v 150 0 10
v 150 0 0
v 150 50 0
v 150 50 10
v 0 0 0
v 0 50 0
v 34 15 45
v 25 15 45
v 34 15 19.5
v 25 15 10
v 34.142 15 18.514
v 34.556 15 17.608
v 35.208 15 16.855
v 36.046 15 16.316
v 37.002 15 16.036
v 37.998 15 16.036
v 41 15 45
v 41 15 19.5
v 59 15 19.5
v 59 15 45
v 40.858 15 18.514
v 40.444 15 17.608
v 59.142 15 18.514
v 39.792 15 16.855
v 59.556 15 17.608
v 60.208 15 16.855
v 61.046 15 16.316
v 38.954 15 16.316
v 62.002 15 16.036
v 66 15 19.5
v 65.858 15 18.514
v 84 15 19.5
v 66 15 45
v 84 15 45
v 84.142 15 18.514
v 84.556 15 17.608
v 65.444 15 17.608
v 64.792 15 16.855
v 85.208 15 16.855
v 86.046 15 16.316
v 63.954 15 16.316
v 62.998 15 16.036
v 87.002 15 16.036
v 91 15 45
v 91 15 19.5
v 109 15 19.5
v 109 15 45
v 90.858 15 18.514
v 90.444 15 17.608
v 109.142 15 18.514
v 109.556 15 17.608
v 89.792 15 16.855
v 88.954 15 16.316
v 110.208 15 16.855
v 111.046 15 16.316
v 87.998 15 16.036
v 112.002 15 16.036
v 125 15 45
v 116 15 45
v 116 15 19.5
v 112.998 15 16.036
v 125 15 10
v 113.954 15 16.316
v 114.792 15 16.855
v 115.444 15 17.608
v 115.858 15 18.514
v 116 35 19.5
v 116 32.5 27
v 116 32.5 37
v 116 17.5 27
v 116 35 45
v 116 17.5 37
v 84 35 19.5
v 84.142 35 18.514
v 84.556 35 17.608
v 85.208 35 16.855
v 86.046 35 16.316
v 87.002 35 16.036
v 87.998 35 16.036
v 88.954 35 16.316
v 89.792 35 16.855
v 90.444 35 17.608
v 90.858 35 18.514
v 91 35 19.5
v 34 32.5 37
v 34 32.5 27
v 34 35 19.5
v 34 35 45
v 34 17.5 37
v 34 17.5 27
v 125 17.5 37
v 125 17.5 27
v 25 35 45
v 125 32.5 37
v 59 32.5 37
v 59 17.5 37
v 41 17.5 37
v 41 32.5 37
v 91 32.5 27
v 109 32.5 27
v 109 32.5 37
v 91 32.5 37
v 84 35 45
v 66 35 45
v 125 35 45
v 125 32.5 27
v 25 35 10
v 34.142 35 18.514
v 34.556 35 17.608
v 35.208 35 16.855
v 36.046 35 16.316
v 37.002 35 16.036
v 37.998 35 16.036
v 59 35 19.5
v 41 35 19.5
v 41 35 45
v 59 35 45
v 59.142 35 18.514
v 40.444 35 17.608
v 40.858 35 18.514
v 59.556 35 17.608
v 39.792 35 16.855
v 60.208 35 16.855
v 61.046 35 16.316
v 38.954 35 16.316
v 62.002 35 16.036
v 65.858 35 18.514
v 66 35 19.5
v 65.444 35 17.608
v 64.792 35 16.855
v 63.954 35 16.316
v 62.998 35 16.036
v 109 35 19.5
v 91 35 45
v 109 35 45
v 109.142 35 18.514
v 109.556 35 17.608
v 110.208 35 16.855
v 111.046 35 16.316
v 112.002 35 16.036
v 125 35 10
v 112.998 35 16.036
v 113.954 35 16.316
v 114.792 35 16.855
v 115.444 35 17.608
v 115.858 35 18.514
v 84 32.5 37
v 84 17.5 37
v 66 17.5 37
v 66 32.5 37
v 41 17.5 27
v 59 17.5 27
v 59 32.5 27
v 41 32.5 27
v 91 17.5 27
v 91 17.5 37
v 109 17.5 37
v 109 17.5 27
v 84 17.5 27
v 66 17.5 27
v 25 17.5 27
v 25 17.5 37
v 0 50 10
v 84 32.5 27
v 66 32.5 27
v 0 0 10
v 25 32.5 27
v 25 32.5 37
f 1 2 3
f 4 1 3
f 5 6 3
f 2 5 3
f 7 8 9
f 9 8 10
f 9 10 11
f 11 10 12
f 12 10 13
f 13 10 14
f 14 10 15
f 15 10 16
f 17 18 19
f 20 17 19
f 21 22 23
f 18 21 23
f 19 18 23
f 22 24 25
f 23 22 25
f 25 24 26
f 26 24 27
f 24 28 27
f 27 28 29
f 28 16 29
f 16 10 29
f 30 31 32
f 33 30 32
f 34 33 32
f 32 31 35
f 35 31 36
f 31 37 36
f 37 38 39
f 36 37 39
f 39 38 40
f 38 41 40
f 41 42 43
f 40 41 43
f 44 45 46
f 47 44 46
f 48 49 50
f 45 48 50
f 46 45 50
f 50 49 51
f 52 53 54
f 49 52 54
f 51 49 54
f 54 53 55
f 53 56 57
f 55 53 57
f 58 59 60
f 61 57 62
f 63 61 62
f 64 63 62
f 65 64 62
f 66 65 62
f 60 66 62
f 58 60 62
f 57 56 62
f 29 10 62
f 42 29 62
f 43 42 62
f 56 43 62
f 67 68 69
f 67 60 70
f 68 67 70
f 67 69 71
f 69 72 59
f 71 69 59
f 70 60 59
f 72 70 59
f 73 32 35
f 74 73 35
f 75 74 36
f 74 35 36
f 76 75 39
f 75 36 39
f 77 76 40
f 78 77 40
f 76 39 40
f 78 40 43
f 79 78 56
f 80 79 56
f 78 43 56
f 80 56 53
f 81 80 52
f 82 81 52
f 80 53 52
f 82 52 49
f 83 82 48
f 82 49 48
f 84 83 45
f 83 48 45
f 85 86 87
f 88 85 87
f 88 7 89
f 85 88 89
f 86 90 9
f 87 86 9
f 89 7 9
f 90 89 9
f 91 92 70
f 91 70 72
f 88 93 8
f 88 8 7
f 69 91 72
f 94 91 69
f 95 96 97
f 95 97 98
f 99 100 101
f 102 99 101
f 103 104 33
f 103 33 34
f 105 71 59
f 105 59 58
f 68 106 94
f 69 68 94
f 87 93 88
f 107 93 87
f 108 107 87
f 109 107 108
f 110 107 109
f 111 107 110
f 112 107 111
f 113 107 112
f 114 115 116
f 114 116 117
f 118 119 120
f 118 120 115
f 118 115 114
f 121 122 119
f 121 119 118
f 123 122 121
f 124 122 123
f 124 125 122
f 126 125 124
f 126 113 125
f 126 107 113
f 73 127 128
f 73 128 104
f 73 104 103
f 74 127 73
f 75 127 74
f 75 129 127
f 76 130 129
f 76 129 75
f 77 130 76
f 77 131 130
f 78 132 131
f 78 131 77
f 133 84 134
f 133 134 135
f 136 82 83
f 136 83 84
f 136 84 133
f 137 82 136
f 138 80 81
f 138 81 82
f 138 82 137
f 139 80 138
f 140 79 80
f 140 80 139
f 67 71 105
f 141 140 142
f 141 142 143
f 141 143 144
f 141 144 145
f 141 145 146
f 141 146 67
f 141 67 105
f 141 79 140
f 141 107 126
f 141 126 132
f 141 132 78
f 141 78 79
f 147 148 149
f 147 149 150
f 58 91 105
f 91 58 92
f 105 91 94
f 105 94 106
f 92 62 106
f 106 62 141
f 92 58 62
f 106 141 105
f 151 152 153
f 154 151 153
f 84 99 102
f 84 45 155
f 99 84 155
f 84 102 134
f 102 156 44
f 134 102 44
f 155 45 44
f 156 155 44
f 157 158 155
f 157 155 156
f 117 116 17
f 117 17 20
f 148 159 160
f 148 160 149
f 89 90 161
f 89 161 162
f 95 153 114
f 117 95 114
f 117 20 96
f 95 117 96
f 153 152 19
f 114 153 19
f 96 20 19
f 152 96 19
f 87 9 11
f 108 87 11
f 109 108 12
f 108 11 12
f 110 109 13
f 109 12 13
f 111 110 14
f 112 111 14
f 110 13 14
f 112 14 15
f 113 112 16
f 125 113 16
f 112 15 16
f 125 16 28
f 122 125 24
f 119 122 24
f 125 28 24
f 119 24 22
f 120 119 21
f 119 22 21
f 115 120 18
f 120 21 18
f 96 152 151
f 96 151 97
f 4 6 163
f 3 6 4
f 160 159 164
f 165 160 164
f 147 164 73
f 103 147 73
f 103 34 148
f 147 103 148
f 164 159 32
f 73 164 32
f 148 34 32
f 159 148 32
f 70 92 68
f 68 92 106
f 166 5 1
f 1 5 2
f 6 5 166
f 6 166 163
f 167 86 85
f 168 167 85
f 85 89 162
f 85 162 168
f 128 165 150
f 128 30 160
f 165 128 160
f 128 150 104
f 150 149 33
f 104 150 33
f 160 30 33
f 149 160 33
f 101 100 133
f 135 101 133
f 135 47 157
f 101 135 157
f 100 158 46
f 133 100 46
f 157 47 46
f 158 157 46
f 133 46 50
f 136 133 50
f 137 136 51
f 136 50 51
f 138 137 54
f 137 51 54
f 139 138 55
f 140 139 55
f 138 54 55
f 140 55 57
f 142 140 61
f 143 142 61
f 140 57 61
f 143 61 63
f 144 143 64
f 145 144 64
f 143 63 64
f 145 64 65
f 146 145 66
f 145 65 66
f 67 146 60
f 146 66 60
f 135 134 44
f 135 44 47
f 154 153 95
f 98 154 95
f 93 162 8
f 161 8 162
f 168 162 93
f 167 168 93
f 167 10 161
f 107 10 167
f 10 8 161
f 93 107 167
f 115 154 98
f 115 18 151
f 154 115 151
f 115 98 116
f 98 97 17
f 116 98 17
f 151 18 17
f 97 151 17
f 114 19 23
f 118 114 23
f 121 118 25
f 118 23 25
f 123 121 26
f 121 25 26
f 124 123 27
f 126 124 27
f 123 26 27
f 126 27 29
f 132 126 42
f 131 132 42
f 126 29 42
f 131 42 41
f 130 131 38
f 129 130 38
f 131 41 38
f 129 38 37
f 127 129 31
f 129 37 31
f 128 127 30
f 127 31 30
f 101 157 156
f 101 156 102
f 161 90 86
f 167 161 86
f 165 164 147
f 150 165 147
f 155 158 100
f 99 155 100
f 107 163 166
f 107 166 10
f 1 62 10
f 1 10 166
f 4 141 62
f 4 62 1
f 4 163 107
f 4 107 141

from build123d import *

# Parameters (mm, degrees)
F0_W     = 150
F0_H     = 50
F1_DEPTH = 10
F2_W     = 100
F2_H     = 20
F3_DEPTH = 35
F5_DEPTH = 35.001
F6_W     = 15
F6_H     = 10
F7_DEPTH = 125.001


with BuildPart() as f1:
    # F0 (on Top) → F1 (new body)
    with BuildSketch(Plane.XY):
        with Locations((75, 25)):
            Rectangle(F0_W, F0_H)
    extrude(amount=F1_DEPTH)

    # F2 (on face) → F3 (join)
    with BuildSketch(Plane.XY.offset(10)):
        with Locations((75, 25)):
            Rectangle(F2_W, F2_H)
    extrude(amount=F3_DEPTH)

    # F4 (on face) → F5 (cut, through all)
    with BuildSketch(Plane.XZ.offset(-15)):
        with BuildLine():
            Line((41, 45), (34, 45))
            Line((34, 45), (34, 19.5))
            ThreePointArc((34, 19.5), (37.5, 16), (41, 19.5))
            Line((41, 19.5), (41, 45))
        make_face()
        with BuildLine():
            Line((116, 19.5), (116, 45))
            Line((116, 45), (109, 45))
            Line((109, 45), (109, 19.5))
            ThreePointArc((109, 19.5), (112.5, 16), (116, 19.5))
        make_face()
        with BuildLine():
            Line((66, 45), (59, 45))
            Line((59, 45), (59, 19.5))
            ThreePointArc((59, 19.5), (62.5, 16), (66, 19.5))
            Line((66, 19.5), (66, 45))
        make_face()
        with BuildLine():
            ThreePointArc((84, 19.5), (87.5, 16), (91, 19.5))
            Line((91, 19.5), (91, 45))
            Line((91, 45), (84, 45))
            Line((84, 45), (84, 19.5))
        make_face()
    extrude(amount=-F5_DEPTH, mode=Mode.SUBTRACT)

    # F6 (on face) → F7 (cut, through all)
    with BuildSketch(Plane.YZ.offset(125)):
        with Locations((25, 32)):
            Rectangle(F6_W, F6_H)
    extrude(amount=-F7_DEPTH, mode=Mode.SUBTRACT)


solid = f1.part
